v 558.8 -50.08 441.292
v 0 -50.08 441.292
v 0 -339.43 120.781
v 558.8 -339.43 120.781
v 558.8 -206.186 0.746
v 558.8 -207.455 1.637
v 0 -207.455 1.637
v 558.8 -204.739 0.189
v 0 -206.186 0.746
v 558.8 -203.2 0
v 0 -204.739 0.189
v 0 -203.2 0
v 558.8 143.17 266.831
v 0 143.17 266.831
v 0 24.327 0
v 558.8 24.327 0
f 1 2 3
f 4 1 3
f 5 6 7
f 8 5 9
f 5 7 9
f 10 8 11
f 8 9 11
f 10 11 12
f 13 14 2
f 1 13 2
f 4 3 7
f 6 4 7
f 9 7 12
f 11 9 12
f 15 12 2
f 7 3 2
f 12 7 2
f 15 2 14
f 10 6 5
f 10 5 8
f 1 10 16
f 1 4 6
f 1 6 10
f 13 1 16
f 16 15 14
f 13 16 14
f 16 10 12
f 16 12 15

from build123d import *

# Parameters (mm, degrees)
F1_DEPTH = 558.8


with BuildPart() as f1:
    # F0 (on Right) → F1 (new body)
    with BuildSketch(Plane.YZ):
        with BuildLine():
            Line((-203.2, 0), (0, 0))
            Line((0, 0), (24.326557, 0))
            Line((24.326557, 0), (143.169588, 266.830928))
            Line((143.169588, 266.830928), (-50.079897, 441.292268))
            Line((-50.079897, 441.292268), (-339.430412, 120.780928))
            Line((-339.430412, 120.780928), (-207.455155, 1.636598))
            ThreePointArc((-207.455155, 1.636598), (-205.479517, 0.423255), (-203.2, 0))
        make_face()
    extrude(amount=F1_DEPTH)


solid = f1.part
